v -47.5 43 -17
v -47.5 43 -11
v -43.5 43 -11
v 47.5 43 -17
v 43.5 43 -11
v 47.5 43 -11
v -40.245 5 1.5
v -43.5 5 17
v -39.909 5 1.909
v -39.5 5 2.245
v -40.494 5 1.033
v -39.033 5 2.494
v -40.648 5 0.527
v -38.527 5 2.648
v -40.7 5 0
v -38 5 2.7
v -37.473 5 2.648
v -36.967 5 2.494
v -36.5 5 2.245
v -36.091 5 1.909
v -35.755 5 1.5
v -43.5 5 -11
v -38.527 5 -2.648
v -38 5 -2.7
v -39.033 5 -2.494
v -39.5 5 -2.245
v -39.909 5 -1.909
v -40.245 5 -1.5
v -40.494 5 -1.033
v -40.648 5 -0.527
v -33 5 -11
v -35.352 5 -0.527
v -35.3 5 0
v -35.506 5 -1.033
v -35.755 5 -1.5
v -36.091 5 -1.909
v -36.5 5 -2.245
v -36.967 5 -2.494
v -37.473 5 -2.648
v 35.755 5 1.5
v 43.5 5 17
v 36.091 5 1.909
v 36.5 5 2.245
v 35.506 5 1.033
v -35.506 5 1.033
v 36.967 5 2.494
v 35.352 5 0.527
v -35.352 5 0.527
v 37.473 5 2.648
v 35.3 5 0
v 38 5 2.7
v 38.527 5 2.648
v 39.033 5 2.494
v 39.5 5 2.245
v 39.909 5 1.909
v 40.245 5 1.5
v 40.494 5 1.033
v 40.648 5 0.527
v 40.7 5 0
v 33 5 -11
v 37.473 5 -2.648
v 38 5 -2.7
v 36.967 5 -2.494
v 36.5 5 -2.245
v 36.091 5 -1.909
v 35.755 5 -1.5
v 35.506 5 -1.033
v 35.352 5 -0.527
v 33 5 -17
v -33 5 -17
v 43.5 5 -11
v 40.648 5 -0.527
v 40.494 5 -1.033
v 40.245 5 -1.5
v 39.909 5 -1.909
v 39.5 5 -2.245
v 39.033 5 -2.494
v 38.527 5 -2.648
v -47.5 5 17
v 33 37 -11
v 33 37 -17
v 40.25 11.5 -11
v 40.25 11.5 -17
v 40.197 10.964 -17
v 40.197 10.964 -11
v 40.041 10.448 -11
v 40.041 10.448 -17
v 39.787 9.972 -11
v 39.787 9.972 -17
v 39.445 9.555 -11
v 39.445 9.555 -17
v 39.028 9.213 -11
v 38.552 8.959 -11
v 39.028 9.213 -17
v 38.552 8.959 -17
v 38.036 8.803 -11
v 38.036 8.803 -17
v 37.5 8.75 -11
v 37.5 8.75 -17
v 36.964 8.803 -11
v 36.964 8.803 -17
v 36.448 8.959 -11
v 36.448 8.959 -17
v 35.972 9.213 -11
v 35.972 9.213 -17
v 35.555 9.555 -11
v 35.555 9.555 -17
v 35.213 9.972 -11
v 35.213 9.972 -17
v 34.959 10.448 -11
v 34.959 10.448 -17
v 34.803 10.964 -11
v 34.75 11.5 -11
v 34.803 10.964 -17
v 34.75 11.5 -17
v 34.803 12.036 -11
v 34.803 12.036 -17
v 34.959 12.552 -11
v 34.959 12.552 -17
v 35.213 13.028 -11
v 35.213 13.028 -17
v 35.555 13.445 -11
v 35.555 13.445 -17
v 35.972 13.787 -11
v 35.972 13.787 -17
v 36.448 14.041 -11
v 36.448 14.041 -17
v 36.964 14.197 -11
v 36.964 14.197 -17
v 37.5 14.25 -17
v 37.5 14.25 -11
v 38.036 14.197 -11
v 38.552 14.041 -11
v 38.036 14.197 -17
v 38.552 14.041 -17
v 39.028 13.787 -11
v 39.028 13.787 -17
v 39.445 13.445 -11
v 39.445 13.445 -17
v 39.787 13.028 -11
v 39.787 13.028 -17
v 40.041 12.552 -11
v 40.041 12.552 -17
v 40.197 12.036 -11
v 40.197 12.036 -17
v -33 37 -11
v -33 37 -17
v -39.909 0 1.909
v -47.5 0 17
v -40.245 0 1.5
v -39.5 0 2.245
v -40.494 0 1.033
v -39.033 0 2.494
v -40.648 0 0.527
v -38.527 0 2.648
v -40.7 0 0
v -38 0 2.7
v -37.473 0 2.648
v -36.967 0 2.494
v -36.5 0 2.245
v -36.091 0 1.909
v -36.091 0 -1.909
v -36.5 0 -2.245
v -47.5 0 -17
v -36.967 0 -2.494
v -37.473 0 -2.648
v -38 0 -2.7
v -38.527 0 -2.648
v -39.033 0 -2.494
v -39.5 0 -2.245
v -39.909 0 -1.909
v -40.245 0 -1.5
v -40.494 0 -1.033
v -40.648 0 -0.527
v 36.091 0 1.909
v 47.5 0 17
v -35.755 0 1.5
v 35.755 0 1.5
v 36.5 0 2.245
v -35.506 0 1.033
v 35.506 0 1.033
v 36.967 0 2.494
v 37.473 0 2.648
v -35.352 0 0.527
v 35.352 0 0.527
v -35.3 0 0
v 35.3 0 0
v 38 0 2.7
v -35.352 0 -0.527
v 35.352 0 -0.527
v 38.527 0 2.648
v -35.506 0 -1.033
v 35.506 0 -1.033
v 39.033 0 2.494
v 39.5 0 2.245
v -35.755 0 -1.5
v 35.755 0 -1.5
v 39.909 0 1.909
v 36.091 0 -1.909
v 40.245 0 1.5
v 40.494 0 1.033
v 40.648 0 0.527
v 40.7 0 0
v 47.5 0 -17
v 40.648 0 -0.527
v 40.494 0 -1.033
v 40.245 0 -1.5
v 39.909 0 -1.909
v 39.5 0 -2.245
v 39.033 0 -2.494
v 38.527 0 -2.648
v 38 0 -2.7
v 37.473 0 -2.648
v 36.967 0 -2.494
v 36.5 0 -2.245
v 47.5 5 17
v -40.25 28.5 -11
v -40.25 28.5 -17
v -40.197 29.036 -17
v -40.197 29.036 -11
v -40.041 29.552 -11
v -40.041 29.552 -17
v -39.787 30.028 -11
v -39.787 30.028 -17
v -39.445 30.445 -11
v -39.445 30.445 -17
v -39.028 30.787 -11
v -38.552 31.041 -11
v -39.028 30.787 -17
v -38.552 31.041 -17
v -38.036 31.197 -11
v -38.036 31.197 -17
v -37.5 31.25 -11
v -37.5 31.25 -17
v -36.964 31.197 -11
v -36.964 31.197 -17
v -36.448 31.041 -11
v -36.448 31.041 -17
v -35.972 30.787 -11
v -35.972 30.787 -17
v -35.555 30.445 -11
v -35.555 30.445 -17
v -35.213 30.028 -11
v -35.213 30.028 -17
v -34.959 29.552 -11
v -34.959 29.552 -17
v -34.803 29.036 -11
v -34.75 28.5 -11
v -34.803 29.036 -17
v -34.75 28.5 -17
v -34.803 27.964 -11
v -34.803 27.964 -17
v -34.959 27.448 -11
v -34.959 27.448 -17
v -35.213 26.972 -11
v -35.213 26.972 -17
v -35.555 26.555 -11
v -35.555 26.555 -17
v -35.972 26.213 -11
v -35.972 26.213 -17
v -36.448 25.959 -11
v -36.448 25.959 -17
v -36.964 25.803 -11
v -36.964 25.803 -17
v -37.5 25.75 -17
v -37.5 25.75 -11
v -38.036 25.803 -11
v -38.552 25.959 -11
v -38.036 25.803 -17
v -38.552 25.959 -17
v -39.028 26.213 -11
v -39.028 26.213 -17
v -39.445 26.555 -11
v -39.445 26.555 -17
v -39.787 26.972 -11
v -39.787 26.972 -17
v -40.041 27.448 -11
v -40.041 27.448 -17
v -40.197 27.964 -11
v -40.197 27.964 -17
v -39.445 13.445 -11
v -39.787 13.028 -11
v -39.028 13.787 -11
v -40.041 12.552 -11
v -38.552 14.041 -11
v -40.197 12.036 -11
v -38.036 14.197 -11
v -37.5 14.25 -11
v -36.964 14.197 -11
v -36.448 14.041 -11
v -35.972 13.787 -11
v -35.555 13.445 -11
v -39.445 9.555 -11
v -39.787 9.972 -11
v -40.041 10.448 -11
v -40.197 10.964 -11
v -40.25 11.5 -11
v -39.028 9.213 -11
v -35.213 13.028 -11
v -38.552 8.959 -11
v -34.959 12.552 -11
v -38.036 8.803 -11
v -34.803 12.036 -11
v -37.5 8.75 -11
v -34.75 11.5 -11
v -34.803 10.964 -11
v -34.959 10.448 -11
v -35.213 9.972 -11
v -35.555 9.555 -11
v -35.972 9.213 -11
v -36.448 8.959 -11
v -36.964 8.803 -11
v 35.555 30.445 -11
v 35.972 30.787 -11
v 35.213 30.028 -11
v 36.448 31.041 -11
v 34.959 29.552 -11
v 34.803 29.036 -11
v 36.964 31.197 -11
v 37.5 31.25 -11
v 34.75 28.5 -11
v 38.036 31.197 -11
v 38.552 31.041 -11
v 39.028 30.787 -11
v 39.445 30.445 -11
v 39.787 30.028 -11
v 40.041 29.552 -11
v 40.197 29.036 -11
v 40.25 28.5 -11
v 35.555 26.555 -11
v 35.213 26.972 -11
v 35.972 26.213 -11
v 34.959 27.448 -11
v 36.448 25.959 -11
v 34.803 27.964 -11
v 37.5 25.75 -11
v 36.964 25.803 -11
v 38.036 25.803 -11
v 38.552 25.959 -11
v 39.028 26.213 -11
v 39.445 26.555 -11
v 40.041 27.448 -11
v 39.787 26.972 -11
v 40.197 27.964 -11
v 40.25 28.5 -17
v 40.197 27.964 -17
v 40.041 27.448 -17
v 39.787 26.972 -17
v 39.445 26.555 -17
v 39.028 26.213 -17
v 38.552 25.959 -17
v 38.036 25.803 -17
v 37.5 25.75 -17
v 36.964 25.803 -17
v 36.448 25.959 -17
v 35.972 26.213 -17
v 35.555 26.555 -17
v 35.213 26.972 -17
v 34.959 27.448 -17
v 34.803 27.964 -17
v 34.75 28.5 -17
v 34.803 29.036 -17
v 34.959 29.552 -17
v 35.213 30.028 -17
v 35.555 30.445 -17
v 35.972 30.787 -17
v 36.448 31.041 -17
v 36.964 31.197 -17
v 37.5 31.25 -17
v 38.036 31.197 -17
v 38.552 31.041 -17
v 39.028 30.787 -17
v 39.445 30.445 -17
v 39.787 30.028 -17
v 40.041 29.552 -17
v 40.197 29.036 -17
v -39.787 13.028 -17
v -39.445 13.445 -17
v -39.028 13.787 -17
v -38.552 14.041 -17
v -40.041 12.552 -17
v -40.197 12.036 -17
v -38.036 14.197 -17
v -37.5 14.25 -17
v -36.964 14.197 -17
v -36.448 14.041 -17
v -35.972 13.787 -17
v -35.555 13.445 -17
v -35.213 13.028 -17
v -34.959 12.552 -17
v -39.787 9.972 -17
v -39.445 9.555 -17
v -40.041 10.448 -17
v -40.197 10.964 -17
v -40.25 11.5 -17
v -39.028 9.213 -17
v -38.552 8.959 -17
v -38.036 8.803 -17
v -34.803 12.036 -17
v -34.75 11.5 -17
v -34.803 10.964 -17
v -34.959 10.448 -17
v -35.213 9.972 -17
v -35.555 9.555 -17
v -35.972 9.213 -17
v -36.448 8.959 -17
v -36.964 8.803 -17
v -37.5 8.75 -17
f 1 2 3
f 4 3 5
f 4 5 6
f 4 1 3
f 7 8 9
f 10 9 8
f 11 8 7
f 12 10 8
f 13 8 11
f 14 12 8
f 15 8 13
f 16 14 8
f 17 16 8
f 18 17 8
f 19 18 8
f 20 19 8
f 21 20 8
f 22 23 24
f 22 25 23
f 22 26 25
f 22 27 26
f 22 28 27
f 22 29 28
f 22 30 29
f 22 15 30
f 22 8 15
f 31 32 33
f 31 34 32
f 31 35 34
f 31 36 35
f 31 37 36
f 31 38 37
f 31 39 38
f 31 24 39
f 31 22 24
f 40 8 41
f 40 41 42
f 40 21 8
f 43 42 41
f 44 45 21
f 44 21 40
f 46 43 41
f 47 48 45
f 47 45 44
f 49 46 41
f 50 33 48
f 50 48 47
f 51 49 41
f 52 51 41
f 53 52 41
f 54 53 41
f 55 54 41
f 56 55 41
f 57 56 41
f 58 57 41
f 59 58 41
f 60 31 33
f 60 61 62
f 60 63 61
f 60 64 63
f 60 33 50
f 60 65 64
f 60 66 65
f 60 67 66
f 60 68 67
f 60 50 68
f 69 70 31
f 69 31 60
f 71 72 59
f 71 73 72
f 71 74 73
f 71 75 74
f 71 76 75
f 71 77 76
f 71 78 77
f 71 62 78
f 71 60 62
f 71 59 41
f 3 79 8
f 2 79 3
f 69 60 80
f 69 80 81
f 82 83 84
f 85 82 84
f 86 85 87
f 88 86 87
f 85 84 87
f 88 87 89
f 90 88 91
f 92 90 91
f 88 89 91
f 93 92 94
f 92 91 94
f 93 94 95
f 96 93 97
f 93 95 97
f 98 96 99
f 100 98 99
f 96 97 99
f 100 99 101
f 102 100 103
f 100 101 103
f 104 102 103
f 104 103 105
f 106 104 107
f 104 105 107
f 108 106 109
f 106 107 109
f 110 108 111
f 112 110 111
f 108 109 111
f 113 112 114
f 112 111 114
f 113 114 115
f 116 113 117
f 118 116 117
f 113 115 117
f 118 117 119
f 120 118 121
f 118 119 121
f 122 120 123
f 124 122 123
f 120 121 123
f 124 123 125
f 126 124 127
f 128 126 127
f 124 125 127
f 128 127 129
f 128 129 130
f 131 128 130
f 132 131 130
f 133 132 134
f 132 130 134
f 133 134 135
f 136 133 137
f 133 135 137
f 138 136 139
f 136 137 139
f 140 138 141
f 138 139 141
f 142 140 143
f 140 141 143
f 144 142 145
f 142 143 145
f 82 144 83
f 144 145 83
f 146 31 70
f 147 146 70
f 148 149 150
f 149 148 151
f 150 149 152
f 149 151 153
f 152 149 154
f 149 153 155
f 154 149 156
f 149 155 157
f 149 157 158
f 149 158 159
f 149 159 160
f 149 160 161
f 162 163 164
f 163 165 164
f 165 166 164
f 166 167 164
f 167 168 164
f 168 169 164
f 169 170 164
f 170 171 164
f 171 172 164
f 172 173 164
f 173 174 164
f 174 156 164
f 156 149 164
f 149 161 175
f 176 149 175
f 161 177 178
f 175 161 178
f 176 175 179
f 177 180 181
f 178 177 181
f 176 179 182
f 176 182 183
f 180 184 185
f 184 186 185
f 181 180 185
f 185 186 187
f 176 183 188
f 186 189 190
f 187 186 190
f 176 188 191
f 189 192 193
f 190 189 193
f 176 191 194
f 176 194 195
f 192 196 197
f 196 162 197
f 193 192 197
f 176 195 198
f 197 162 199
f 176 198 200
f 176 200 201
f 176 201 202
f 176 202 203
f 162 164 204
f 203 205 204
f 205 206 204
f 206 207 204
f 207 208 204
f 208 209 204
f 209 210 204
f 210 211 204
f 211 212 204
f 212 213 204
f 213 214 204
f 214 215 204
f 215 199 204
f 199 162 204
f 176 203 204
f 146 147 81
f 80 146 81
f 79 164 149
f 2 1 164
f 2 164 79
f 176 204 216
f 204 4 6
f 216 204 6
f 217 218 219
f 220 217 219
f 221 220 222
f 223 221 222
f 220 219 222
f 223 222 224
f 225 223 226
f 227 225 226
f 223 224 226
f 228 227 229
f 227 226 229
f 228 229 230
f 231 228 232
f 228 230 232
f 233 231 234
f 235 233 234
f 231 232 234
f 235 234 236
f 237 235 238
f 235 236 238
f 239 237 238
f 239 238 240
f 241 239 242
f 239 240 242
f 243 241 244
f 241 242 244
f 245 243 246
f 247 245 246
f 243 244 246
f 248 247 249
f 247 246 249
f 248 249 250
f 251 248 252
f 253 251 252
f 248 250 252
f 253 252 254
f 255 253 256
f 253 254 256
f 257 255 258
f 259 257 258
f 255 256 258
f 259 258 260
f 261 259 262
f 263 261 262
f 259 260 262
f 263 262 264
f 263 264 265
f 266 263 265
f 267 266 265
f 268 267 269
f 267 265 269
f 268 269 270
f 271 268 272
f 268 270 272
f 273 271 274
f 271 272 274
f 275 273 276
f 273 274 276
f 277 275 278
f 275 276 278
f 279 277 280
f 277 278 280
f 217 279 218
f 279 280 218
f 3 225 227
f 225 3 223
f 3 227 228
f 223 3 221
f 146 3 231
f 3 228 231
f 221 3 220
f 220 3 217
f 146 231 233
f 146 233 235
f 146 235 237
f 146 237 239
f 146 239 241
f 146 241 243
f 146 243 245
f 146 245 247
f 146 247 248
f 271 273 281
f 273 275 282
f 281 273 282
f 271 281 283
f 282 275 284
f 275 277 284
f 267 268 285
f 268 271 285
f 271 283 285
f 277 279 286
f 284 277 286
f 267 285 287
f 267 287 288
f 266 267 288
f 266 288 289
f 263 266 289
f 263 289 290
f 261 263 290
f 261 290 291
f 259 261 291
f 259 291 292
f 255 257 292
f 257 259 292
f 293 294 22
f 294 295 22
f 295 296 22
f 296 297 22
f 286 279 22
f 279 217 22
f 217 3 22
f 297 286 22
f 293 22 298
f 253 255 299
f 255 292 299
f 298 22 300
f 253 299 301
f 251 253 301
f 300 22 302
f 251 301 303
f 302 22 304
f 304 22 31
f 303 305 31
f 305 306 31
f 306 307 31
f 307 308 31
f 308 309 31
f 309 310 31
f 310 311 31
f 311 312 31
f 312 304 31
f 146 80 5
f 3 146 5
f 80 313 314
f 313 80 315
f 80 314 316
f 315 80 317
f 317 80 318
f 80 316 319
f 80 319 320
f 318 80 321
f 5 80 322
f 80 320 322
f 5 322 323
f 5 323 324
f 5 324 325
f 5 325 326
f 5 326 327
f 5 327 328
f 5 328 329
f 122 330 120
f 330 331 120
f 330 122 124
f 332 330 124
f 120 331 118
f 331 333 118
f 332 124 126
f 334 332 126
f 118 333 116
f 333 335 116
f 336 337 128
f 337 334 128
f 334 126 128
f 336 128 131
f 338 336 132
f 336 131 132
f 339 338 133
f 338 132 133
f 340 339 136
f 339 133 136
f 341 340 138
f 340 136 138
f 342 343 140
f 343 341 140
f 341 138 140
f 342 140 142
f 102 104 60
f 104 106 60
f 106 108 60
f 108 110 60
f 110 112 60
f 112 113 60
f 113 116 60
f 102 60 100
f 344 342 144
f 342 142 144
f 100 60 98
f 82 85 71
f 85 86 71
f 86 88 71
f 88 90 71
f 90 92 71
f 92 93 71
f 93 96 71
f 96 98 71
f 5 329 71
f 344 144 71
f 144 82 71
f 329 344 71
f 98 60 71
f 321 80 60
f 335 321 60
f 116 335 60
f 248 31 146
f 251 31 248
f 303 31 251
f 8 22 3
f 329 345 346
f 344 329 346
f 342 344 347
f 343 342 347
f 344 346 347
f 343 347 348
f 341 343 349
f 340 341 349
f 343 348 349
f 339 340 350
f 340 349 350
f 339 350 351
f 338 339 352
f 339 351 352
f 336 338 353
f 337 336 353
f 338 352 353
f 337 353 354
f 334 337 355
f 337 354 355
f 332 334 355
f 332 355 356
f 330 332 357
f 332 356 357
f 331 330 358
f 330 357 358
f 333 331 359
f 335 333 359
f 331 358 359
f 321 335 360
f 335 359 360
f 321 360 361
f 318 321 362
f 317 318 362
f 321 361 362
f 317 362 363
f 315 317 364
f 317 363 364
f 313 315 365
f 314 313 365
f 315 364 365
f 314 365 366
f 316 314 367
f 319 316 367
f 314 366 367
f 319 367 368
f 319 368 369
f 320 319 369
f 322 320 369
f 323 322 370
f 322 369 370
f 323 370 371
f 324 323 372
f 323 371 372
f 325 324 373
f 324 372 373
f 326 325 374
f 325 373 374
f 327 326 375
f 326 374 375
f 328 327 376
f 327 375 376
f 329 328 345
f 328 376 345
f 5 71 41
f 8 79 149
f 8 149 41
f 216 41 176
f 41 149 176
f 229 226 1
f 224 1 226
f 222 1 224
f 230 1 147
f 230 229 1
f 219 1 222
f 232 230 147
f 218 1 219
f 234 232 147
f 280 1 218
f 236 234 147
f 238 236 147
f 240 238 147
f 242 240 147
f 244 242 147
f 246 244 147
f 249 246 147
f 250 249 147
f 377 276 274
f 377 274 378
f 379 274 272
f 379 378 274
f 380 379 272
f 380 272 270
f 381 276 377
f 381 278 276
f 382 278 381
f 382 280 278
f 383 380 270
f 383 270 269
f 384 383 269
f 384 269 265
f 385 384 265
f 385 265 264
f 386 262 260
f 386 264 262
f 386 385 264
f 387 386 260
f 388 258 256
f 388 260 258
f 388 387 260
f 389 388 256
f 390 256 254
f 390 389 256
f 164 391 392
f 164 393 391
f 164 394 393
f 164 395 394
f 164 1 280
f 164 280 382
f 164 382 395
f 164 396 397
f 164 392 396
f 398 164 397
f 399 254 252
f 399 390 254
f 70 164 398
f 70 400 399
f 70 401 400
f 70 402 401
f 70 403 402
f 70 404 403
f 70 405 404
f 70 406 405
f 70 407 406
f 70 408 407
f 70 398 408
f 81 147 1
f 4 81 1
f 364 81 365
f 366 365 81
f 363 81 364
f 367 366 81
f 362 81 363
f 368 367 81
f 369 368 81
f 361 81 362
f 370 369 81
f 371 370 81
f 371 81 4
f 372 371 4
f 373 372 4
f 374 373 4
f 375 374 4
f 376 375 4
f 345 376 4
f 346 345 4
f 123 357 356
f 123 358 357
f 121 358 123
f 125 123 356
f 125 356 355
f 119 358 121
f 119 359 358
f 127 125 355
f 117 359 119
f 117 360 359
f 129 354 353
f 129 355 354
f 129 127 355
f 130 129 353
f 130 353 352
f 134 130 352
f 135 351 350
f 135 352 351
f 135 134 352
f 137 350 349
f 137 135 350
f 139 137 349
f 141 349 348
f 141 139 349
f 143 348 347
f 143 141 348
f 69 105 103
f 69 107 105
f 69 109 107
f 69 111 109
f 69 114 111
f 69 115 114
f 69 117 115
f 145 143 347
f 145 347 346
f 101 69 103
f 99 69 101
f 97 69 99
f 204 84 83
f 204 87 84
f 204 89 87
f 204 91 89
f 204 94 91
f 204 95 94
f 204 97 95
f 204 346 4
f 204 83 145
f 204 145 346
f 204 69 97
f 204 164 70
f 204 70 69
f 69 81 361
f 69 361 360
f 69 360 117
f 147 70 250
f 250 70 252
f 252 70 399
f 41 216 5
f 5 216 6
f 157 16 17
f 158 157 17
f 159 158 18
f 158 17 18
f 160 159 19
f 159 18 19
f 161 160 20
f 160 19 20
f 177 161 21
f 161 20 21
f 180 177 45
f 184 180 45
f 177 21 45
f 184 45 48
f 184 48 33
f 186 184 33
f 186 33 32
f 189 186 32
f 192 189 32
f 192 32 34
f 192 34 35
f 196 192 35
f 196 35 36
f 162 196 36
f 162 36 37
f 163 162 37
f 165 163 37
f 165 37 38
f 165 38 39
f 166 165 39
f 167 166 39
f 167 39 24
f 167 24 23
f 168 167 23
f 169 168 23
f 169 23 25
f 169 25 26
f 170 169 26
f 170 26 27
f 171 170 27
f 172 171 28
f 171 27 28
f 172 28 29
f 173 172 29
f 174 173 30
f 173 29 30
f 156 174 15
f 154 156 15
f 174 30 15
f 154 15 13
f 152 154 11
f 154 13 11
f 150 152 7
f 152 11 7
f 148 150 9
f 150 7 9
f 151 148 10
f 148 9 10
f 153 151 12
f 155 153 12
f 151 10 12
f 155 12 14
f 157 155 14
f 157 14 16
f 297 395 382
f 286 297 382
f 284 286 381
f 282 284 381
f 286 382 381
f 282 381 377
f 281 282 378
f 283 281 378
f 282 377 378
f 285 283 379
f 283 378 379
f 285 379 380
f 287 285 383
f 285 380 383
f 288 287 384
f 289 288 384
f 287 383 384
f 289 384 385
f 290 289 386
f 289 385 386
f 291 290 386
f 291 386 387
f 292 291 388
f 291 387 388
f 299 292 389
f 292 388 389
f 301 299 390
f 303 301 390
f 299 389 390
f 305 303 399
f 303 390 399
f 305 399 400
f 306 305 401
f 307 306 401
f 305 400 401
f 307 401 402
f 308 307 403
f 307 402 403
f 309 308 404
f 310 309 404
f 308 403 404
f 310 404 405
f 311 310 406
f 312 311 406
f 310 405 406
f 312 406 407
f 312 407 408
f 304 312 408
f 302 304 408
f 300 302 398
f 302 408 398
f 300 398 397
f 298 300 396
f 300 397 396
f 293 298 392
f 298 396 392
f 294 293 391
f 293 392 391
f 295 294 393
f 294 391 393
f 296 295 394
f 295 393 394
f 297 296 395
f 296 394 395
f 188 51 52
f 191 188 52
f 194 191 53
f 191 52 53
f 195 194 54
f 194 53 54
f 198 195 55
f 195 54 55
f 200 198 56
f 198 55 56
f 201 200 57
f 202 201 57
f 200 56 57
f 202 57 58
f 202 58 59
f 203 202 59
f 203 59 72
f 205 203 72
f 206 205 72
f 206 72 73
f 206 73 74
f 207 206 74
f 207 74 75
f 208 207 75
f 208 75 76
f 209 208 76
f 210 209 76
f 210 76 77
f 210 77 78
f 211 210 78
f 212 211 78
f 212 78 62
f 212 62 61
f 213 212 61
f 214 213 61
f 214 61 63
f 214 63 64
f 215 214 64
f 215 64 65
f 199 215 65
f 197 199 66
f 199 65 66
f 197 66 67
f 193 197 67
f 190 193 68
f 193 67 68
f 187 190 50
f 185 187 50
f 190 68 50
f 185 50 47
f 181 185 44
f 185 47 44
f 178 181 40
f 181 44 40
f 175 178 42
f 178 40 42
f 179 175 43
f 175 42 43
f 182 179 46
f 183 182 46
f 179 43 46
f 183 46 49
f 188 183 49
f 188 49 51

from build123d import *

# Parameters (mm, degrees)
SKETCH1_W           = 95
SKETCH1_H           = 34
BOSS_EXTRUDE1_DEPTH = 5
SKETCH2_W           = 14.5
SKETCH2_H           = 6
BOSS_EXTRUDE2_DEPTH = 38
SKETCH3_W           = 95
SKETCH3_H           = 6
BOSS_EXTRUDE3_DEPTH = 6
SKETCH4_R           = 2.75
CUT_EXTRUDE1_DEPTH  = 6
SKETCH6_R           = 2.7
CUT_EXTRUDE2_DEPTH  = 6
BOSS_EXTRUDE4_DEPTH = 4


with BuildPart() as part:
    # Sketch1 → Boss-Extrude1 (new body)
    with BuildSketch(Plane(origin=(0, 0, 0), x_dir=(1, 0, 0), z_dir=(0, 1, 0))):
        Rectangle(SKETCH1_W, SKETCH1_H)
    extrude(amount=BOSS_EXTRUDE1_DEPTH)

    # Sketch2 → Boss-Extrude2 (add)
    with BuildSketch(Plane(origin=(0, 5, 0), x_dir=(1, 0, 0), z_dir=(0, 1, 0))):
        with Locations((-40.25, 14)):
            Rectangle(SKETCH2_W, SKETCH2_H)
        with Locations((40.25, 14)):
            Rectangle(SKETCH2_W, SKETCH2_H)
    extrude(amount=BOSS_EXTRUDE2_DEPTH)

    # Sketch3 → Boss-Extrude3 (add)
    with BuildSketch(Plane(origin=(0, 43, 0), x_dir=(1, 0, 0), z_dir=(0, 1, 0))):
        with Locations((0, 14)):
            Rectangle(SKETCH3_W, SKETCH3_H)
    extrude(amount=-BOSS_EXTRUDE3_DEPTH)

    # Sketch4 → Cut-Extrude1 (cut)
    with BuildSketch(Plane(origin=(0, 0, -17), x_dir=(-1, 0, 0), z_dir=(0, 0, -1))):
        with Locations((37.5, 11.5)):
            Circle(SKETCH4_R)
        with Locations((37.5, 28.5)):
            Circle(SKETCH4_R)
        with Locations(Location((-37.5, 28.5, 0), (0, 0, 180))):
            Circle(SKETCH4_R)
        with Locations(Location((-37.5, 11.5, 0), (0, 0, 180))):
            Circle(SKETCH4_R)
    extrude(amount=-CUT_EXTRUDE1_DEPTH, mode=Mode.SUBTRACT)

    # Sketch6 → Cut-Extrude2 (cut)
    with BuildSketch(Plane(origin=(0, 5, 0), x_dir=(1, 0, 0), z_dir=(0, 1, 0))):
        with Locations(Location((-38, 0, 0), (0, 0, 270))):
            Circle(SKETCH6_R)
        with Locations(Location((38, 0, 0), (0, 0, 270))):
            Circle(SKETCH6_R)
    extrude(amount=-CUT_EXTRUDE2_DEPTH, mode=Mode.SUBTRACT)

    # Sketch7 → Boss-Extrude4 (add)
    with BuildSketch(Plane.ZY.offset(47.5)):
        Polygon((17, 5), (-11, 43), (-11, 5), align=None)
    boss_extrude4 = extrude(amount=-BOSS_EXTRUDE4_DEPTH)

    # Mirror1: Boss-Extrude4 across plane
    add(boss_extrude4.mirror(Plane(origin=(0, 0, 0), x_dir=(0, 0, 1), z_dir=(1, 0, 0))))


solid = part.part
